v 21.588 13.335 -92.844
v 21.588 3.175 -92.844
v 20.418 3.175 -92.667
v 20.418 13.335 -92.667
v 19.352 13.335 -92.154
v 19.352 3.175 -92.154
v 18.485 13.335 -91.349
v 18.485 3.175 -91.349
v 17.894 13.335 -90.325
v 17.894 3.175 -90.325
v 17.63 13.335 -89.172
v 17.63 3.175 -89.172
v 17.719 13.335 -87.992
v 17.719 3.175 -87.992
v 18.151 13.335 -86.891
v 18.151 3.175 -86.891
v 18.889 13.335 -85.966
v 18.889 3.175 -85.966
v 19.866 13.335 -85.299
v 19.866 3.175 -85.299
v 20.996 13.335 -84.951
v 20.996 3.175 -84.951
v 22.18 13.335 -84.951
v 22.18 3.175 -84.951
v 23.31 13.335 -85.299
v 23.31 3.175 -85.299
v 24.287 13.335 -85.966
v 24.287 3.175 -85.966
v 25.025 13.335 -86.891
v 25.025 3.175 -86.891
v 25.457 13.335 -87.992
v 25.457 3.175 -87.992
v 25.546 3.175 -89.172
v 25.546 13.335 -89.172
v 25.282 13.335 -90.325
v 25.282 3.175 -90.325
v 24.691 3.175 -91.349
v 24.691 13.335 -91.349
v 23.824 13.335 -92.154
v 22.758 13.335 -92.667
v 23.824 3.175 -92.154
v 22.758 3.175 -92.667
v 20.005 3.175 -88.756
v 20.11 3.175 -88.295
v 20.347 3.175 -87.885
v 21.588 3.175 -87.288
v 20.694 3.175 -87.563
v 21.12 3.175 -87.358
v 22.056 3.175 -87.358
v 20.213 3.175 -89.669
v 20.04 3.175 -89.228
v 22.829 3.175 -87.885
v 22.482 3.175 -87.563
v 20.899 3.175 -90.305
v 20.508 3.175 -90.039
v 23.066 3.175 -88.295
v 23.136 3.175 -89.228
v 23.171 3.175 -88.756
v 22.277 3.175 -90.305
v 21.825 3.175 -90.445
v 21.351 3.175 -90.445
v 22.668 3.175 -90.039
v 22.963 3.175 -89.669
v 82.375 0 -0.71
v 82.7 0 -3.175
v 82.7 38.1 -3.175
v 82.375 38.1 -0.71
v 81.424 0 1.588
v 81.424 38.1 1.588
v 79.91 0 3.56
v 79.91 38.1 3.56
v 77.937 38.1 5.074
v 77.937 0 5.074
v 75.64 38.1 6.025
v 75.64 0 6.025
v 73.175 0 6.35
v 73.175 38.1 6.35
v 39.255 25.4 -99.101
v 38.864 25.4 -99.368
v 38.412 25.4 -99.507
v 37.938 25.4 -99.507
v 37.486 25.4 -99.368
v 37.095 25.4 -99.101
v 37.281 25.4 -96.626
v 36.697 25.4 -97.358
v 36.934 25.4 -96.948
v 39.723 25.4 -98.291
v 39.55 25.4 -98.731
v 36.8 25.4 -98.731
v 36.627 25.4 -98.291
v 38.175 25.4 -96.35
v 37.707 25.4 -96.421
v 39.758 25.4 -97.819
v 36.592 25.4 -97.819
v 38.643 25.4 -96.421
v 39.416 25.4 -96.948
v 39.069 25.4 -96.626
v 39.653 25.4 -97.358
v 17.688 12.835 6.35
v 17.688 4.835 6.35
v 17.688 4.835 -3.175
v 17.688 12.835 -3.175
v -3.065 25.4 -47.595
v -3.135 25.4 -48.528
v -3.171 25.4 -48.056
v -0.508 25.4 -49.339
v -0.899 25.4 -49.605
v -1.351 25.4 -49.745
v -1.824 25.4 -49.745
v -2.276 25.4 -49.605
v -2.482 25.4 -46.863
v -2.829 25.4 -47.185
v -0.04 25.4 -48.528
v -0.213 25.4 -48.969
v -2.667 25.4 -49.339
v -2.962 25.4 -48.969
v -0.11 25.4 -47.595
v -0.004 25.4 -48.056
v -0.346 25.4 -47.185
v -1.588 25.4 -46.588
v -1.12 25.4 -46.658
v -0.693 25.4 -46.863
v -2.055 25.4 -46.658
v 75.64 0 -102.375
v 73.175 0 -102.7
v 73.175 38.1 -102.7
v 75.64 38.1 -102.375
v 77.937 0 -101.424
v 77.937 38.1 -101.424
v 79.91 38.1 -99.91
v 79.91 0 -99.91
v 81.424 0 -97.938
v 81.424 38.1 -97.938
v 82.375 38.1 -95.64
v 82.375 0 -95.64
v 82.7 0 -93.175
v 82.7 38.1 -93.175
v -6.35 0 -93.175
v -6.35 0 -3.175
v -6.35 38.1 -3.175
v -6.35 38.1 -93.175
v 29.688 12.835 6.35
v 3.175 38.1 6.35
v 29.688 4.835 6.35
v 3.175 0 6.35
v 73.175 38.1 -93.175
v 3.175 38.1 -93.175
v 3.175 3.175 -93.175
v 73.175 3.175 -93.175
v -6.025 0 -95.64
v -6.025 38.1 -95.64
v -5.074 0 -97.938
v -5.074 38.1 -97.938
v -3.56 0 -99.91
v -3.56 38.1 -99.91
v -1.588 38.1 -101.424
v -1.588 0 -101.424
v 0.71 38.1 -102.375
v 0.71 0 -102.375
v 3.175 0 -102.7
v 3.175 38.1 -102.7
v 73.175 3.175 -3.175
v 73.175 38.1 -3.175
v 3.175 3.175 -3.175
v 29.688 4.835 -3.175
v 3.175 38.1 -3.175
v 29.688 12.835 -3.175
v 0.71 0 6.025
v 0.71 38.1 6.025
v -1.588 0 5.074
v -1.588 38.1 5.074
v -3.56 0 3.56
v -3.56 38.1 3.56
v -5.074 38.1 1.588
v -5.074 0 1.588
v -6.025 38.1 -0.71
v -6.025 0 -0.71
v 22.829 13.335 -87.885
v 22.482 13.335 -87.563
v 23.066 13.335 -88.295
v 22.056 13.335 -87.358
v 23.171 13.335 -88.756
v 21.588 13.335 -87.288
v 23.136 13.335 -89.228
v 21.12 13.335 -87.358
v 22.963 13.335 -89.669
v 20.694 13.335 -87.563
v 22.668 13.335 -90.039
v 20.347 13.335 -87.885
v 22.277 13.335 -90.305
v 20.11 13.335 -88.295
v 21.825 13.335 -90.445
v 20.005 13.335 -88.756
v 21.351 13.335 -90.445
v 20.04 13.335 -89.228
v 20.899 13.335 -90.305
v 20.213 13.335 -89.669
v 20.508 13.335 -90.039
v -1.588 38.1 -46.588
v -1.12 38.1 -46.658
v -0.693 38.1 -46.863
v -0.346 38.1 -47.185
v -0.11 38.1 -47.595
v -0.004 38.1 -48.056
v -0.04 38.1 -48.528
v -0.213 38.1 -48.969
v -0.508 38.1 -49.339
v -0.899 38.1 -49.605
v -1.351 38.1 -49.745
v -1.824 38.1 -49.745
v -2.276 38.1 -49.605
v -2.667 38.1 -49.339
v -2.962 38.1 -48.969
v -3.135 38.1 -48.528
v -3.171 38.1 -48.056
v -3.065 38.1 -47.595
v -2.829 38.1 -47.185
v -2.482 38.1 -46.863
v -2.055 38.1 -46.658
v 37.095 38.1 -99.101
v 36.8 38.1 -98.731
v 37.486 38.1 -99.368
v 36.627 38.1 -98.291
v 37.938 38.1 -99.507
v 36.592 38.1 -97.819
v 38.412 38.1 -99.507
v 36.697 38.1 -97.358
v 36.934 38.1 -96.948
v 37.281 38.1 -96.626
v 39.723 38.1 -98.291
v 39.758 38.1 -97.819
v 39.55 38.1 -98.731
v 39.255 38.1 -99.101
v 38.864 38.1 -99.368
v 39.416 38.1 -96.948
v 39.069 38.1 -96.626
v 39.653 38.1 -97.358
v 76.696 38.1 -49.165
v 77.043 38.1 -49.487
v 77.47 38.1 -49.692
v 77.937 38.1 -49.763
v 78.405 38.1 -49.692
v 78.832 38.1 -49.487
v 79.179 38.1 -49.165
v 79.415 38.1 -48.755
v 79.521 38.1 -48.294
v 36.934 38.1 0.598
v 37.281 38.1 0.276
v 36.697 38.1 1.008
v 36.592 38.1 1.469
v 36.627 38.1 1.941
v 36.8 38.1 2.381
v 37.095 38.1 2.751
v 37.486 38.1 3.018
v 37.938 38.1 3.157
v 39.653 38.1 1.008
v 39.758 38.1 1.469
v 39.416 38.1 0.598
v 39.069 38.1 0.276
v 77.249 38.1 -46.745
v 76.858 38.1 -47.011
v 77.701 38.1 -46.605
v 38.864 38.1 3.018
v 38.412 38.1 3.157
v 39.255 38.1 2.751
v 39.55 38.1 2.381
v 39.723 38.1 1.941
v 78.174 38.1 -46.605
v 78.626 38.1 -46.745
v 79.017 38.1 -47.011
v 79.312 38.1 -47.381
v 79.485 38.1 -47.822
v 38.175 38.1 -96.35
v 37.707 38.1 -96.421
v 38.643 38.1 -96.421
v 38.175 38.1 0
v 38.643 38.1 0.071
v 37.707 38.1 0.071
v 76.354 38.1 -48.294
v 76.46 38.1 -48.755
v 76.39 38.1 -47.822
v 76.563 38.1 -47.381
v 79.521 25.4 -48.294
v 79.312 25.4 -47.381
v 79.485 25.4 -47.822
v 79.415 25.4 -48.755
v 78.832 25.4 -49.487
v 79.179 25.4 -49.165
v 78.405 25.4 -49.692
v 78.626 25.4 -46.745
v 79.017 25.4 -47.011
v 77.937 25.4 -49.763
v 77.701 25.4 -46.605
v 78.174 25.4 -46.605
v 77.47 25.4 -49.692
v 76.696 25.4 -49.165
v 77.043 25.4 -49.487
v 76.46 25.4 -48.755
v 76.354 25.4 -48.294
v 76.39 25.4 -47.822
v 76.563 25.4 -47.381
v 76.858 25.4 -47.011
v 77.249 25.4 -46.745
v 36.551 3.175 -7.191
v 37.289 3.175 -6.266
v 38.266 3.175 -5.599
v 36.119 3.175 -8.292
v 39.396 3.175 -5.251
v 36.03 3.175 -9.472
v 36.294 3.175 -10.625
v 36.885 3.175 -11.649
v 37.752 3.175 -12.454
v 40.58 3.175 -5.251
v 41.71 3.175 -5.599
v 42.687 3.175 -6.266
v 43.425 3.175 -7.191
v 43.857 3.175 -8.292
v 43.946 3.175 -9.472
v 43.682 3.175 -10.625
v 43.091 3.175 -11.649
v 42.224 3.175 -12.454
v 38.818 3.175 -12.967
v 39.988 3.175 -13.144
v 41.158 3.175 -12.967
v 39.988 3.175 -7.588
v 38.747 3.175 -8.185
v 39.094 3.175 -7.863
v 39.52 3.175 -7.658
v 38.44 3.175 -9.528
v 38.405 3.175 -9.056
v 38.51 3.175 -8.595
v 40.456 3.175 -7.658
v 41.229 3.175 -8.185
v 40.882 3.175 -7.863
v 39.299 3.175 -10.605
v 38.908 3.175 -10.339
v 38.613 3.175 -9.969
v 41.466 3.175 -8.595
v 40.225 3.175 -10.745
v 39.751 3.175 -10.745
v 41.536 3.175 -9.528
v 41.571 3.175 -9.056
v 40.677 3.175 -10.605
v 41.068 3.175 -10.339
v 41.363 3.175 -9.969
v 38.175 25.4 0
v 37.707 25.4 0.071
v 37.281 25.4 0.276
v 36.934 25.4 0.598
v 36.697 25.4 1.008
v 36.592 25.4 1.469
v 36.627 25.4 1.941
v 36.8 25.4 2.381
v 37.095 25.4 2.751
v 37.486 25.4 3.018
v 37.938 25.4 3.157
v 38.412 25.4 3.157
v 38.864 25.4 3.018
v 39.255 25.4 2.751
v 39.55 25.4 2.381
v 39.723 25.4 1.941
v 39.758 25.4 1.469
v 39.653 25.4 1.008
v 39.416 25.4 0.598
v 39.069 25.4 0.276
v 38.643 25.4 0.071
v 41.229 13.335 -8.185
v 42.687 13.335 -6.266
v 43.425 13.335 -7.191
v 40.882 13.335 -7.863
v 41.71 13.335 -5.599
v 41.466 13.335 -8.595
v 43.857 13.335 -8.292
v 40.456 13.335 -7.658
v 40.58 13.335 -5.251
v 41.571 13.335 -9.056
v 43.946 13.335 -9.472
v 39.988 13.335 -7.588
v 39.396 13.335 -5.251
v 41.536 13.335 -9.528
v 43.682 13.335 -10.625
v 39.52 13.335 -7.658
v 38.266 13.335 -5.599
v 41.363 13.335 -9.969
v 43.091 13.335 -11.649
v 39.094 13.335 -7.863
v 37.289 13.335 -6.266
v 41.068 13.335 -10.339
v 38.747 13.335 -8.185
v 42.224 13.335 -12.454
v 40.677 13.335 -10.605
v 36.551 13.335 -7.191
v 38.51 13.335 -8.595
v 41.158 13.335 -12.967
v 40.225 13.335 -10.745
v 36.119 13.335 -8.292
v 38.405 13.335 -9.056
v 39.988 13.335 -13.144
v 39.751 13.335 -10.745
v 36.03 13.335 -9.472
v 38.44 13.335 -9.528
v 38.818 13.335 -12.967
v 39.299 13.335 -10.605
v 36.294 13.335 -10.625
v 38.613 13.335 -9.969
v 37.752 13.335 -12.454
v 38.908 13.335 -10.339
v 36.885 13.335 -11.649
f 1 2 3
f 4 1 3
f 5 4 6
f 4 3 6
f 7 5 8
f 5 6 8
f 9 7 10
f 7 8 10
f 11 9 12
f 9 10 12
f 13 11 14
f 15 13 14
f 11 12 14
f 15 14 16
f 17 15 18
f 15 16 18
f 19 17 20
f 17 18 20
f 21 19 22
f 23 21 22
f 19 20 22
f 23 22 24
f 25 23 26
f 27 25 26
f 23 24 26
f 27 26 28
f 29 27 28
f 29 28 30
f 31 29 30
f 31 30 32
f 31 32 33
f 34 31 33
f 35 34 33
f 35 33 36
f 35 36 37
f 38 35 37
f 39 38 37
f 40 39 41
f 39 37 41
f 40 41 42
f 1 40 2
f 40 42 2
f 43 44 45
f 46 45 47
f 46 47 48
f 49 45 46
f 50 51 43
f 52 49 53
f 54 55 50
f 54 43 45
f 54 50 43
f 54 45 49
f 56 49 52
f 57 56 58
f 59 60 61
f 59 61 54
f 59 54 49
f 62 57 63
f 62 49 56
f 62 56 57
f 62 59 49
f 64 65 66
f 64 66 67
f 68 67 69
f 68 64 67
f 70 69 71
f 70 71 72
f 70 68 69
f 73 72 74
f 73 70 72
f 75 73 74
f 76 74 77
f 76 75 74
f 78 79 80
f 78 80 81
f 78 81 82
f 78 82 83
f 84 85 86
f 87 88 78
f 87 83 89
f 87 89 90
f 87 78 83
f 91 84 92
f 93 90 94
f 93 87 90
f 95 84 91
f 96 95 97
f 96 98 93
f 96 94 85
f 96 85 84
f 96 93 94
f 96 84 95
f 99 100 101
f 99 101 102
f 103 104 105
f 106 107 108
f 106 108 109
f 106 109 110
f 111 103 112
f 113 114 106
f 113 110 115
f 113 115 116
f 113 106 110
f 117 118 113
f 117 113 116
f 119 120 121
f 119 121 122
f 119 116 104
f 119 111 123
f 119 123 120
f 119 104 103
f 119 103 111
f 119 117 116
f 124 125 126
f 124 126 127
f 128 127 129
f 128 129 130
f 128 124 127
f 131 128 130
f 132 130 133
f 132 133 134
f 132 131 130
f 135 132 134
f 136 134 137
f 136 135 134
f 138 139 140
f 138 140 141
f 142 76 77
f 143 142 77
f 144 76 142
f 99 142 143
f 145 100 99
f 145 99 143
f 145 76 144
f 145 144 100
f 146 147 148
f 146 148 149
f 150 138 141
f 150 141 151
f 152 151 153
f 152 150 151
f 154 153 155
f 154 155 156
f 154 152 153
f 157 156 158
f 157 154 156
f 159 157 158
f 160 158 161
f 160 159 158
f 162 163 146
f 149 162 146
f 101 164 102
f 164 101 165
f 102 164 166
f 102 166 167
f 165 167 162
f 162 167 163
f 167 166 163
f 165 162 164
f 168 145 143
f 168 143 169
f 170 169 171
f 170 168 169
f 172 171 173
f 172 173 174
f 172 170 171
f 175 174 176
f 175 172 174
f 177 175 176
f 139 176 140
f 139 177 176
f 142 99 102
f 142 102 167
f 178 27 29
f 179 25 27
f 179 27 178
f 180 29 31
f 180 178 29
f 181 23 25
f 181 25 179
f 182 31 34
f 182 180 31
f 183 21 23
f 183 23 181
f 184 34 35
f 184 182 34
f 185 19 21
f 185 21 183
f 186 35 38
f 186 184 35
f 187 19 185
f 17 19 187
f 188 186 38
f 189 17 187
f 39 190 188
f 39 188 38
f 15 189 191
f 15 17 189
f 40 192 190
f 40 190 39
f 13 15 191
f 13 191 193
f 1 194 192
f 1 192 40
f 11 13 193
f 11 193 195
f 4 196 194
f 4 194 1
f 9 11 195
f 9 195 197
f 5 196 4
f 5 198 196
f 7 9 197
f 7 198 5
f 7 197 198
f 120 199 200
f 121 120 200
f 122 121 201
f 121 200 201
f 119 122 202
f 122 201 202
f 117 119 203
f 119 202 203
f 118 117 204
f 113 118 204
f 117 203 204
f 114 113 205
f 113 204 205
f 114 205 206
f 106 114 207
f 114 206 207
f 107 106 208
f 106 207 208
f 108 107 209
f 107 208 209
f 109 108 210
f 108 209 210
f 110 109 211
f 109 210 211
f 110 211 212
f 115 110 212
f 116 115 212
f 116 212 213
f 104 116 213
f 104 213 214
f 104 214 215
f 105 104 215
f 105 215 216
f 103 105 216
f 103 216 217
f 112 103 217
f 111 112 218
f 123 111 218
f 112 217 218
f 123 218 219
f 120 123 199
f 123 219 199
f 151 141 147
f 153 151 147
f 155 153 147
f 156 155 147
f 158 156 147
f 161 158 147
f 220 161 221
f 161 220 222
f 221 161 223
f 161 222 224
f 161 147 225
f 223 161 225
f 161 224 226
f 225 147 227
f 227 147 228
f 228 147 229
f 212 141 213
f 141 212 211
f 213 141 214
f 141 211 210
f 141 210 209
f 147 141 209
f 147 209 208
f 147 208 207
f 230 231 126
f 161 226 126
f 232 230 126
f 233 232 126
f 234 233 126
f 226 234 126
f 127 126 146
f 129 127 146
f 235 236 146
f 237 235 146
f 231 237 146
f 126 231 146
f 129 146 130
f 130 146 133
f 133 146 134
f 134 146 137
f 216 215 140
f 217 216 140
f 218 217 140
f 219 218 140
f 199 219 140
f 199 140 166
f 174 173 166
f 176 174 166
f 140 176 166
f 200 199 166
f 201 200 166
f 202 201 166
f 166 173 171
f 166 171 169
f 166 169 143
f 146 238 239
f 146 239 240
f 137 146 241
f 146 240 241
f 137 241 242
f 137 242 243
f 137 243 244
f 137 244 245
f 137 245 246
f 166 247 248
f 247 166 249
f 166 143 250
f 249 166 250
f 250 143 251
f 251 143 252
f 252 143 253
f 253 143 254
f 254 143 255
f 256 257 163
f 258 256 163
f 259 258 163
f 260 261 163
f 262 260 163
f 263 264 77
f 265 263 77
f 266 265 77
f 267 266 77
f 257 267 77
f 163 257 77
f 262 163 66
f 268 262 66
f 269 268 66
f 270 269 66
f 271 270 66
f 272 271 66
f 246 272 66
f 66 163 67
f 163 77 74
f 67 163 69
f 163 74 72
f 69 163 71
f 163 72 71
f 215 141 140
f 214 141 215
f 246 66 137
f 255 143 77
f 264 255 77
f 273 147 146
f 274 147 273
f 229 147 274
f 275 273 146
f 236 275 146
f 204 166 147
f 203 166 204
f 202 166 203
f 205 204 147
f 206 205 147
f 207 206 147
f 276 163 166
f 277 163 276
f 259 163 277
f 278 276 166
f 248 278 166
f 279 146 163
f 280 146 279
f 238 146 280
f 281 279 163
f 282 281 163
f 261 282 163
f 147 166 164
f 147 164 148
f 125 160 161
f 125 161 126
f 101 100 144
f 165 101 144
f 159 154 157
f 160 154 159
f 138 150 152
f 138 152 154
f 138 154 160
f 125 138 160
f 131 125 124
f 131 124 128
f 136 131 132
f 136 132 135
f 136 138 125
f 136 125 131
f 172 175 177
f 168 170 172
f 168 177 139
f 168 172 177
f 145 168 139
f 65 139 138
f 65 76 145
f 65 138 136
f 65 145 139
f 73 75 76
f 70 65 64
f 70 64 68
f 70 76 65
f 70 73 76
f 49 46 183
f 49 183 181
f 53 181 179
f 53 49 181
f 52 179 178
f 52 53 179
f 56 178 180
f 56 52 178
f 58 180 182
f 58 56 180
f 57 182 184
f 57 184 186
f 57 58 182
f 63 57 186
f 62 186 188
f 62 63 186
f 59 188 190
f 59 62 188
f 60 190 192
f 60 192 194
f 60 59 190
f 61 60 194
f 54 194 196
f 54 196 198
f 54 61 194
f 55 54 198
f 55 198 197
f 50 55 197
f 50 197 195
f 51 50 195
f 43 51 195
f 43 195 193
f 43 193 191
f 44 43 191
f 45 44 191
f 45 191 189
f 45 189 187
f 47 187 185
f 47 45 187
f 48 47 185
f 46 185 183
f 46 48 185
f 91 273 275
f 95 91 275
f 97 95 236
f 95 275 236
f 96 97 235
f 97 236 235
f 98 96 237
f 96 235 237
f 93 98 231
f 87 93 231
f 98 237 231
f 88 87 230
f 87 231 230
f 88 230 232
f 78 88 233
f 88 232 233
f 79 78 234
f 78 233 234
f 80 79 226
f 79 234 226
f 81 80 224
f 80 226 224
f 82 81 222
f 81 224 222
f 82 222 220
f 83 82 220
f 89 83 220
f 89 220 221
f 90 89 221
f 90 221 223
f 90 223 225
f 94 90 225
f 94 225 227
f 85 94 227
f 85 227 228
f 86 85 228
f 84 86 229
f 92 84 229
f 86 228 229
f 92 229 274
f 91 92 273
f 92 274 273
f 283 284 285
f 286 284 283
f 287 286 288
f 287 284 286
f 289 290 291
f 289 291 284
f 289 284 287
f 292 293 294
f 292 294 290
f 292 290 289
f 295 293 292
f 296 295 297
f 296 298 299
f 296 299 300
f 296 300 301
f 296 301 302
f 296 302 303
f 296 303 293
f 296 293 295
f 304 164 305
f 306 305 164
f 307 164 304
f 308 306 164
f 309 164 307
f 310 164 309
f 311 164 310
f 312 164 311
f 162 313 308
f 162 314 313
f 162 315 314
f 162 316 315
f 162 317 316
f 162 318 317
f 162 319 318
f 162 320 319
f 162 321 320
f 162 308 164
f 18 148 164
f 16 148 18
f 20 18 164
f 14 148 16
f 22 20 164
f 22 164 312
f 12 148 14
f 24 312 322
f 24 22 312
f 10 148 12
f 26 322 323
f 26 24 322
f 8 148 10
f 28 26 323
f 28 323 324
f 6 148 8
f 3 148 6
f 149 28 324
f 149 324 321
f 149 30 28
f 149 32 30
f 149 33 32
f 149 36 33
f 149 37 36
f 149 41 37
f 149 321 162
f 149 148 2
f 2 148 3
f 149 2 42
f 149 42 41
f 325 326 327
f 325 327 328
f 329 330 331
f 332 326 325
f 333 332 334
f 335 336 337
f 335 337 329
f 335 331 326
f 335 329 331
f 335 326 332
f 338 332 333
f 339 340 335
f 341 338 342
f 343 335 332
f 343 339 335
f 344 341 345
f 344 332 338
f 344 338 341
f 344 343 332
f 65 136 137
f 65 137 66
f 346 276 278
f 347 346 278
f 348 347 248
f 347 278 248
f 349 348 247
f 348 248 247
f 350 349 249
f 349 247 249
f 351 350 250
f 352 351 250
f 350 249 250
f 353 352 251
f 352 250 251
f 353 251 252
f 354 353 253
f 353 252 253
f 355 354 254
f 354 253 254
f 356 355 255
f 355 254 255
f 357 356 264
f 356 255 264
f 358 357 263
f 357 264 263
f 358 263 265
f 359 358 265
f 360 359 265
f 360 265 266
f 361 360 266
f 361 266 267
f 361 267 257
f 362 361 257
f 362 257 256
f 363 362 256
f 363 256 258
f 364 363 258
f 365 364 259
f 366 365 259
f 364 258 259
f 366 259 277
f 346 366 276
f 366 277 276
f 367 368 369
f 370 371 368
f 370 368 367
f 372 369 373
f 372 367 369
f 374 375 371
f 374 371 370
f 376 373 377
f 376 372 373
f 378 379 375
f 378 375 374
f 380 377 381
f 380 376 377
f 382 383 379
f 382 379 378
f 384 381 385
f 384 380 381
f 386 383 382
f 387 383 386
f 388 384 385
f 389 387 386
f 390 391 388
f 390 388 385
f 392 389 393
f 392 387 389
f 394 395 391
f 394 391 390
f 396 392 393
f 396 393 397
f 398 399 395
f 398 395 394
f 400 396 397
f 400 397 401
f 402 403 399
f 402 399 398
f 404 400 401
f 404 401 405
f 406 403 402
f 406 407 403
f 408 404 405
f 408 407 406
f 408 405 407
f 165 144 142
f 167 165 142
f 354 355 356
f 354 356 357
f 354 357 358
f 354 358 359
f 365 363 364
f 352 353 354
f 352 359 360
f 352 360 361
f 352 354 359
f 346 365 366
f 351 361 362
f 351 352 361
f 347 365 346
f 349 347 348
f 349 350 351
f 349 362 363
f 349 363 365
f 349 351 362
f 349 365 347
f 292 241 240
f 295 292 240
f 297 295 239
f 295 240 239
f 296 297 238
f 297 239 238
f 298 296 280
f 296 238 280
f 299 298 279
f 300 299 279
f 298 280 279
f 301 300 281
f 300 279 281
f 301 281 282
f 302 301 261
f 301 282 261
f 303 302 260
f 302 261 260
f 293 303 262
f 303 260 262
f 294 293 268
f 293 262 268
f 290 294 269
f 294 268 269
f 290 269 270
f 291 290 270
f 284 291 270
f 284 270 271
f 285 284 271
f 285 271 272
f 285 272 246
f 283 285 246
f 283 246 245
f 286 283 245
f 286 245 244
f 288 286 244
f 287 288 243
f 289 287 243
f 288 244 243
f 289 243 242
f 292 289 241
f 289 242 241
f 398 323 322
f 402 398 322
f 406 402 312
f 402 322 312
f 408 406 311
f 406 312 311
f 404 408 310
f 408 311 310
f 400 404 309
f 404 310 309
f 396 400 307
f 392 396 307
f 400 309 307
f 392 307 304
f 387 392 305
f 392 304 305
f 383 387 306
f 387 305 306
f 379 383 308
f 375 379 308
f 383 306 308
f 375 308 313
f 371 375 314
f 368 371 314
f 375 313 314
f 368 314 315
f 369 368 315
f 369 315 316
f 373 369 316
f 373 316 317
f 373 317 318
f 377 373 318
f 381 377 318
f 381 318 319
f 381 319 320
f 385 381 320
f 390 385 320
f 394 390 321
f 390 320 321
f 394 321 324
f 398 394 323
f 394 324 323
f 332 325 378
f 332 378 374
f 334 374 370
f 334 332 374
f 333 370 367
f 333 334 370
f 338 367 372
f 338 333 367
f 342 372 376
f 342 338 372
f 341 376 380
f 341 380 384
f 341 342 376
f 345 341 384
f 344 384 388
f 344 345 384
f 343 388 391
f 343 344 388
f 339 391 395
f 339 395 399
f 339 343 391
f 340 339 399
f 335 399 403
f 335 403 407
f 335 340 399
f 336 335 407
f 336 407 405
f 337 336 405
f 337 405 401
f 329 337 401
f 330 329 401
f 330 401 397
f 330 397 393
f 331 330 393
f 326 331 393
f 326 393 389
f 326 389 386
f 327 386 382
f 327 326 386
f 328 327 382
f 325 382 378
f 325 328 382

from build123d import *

# Parameters (mm, degrees)
BOSS_EXTRUDE1_DEPTH = 38.1
SKETCH2_W           = 69.999999954
SKETCH2_H           = 90.000000086
CUT_EXTRUDE1_DEPTH  = 34.925
SKETCH3_R           = 3.96875
SKETCH3_R_2         = 1.5875
BOSS_EXTRUDE2_DEPTH = 10.16
BOSS_EXTRUDE3_DEPTH = 38.1
SKETCH5_R           = 1.5875
CUT_EXTRUDE2_DEPTH  = 12.7
SKETCH7_W           = 12
SKETCH7_H           = 8
CUT_EXTRUDE3_DEPTH  = 9.525


with BuildPart() as part:
    # Sketch1 → Boss-Extrude1 (new body)
    with BuildSketch(Plane(origin=(0, 0, 0), x_dir=(1, 0, 0), z_dir=(0, 1, 0))):
        with BuildLine():
            Line((3.175, 0), (73.174999954, 0))
            ThreePointArc((73.174999954, 0), (75.420063984, 0.92993597), (76.349999954, 3.175))
            Line((76.349999954, 3.175), (76.349999954, 93.175000086))
            ThreePointArc((76.349999954, 93.175000086), (75.420063984, 95.420064116), (73.174999954, 96.350000086))
            Line((73.174999954, 96.350000086), (3.175, 96.350000086))
            ThreePointArc((3.175, 96.350000086), (0.92993597, 95.420064116), (0, 93.175000086))
            Line((0, 93.175000086), (0, 3.175))
            ThreePointArc((0, 3.175), (0.92993597, 0.92993597), (3.175, 0))
        make_face()
    extrude(amount=BOSS_EXTRUDE1_DEPTH)

    # Sketch2 → Cut-Extrude1 (cut)
    with BuildSketch(Plane(origin=(0, 38.1, 0), x_dir=(1, 0, 0), z_dir=(0, 1, 0))):
        with Locations((38.174999977, 48.175000043)):
            Rectangle(SKETCH2_W, SKETCH2_H)
    extrude(amount=-CUT_EXTRUDE1_DEPTH, mode=Mode.SUBTRACT)

    # Sketch3 → Boss-Extrude2 (add)
    # profile 1 of 2: a face of its own
    with BuildSketch(Plane(origin=(0, 3.175, 0), x_dir=(1, 0, 0), z_dir=(0, 1, 0))):
        with Locations(Location((21.587999977, 88.875000043, 0), (0, 0, 90))):
            Circle(SKETCH3_R)
        with Locations(Location((21.587999977, 88.875000043, 0), (0, 0, 270))):
            Circle(SKETCH3_R_2, mode=Mode.SUBTRACT)
    # profile 2 of 2: a face of its own
    with BuildSketch(Plane(origin=(0, 3.175, 0), x_dir=(1, 0, 0), z_dir=(0, 1, 0))):
        with Locations(Location((39.987999977, 9.175000043, 0), (0, 0, 90))):
            Circle(SKETCH3_R)
        with Locations(Location((39.987999977, 9.175000043, 0), (0, 0, 270))):
            Circle(SKETCH3_R_2, mode=Mode.SUBTRACT)
    extrude(amount=BOSS_EXTRUDE2_DEPTH)

    # Sketch4 → Boss-Extrude3 (add)
    with BuildSketch(Plane.XZ):
        with BuildLine():
            Line((-6.35, -3.175), (-6.35, -93.175000086))
            ThreePointArc((-6.35, -93.175000086), (-3.560192091, -99.910192177), (3.175, -102.700000086))
            Line((3.175, -102.700000086), (73.174999954, -102.700000086))
            ThreePointArc((73.174999954, -102.700000086), (79.910192045, -99.910192177), (82.699999954, -93.175000086))
            Line((82.699999954, -93.175000086), (82.699999954, -3.175))
            ThreePointArc((82.699999954, -3.175), (79.910192045, 3.560192091), (73.174999954, 6.35))
            Line((73.174999954, 6.35), (3.175, 6.35))
            ThreePointArc((3.175, 6.35), (-3.560192091, 3.560192091), (-6.35, -3.175))
        make_face()
        with BuildLine():
            Line((0, -3.175), (0, -93.175000086))
            ThreePointArc((0, -93.175000086), (0.92993597, -95.420064116), (3.175, -96.350000086))
            Line((3.175, -96.350000086), (73.174999954, -96.350000086))
            ThreePointArc((73.174999954, -96.350000086), (75.420063984, -95.420064116), (76.349999954, -93.175000086))
            Line((76.349999954, -93.175000086), (76.349999954, -3.175))
            ThreePointArc((76.349999954, -3.175), (75.420063984, -0.92993597), (73.174999954, 0))
            Line((73.174999954, 0), (3.175, 0))
            ThreePointArc((3.175, 0), (0.92993597, -0.92993597), (0, -3.175))
        make_face(mode=Mode.SUBTRACT)
    extrude(amount=-BOSS_EXTRUDE3_DEPTH)

    # Sketch5 → Cut-Extrude2 (cut)
    with BuildSketch(Plane(origin=(0, 38.1, 0), x_dir=(1, 0, 0), z_dir=(0, 1, 0))):
        with Locations(Location((-1.5875, 48.175000043, 0), (0, 0, 270))):
            Circle(SKETCH5_R)
        with Locations(Location((38.174999977, 97.937500086, 0), (0, 0, 270))):
            Circle(SKETCH5_R)
        with Locations(Location((38.174999977, -1.5875, 0), (0, 0, 90))):
            Circle(SKETCH5_R)
        with Locations(Location((77.937499954, 48.175000043, 0), (0, 0, 90))):
            Circle(SKETCH5_R)
    extrude(amount=-CUT_EXTRUDE2_DEPTH, mode=Mode.SUBTRACT)

    # Sketch7 → Cut-Extrude3 (cut)
    with BuildSketch(Plane.XY.offset(6.35)):
        with Locations((23.687999977, 8.835)):
            Rectangle(SKETCH7_W, SKETCH7_H)
    extrude(amount=-CUT_EXTRUDE3_DEPTH, mode=Mode.SUBTRACT)


solid = part.part
